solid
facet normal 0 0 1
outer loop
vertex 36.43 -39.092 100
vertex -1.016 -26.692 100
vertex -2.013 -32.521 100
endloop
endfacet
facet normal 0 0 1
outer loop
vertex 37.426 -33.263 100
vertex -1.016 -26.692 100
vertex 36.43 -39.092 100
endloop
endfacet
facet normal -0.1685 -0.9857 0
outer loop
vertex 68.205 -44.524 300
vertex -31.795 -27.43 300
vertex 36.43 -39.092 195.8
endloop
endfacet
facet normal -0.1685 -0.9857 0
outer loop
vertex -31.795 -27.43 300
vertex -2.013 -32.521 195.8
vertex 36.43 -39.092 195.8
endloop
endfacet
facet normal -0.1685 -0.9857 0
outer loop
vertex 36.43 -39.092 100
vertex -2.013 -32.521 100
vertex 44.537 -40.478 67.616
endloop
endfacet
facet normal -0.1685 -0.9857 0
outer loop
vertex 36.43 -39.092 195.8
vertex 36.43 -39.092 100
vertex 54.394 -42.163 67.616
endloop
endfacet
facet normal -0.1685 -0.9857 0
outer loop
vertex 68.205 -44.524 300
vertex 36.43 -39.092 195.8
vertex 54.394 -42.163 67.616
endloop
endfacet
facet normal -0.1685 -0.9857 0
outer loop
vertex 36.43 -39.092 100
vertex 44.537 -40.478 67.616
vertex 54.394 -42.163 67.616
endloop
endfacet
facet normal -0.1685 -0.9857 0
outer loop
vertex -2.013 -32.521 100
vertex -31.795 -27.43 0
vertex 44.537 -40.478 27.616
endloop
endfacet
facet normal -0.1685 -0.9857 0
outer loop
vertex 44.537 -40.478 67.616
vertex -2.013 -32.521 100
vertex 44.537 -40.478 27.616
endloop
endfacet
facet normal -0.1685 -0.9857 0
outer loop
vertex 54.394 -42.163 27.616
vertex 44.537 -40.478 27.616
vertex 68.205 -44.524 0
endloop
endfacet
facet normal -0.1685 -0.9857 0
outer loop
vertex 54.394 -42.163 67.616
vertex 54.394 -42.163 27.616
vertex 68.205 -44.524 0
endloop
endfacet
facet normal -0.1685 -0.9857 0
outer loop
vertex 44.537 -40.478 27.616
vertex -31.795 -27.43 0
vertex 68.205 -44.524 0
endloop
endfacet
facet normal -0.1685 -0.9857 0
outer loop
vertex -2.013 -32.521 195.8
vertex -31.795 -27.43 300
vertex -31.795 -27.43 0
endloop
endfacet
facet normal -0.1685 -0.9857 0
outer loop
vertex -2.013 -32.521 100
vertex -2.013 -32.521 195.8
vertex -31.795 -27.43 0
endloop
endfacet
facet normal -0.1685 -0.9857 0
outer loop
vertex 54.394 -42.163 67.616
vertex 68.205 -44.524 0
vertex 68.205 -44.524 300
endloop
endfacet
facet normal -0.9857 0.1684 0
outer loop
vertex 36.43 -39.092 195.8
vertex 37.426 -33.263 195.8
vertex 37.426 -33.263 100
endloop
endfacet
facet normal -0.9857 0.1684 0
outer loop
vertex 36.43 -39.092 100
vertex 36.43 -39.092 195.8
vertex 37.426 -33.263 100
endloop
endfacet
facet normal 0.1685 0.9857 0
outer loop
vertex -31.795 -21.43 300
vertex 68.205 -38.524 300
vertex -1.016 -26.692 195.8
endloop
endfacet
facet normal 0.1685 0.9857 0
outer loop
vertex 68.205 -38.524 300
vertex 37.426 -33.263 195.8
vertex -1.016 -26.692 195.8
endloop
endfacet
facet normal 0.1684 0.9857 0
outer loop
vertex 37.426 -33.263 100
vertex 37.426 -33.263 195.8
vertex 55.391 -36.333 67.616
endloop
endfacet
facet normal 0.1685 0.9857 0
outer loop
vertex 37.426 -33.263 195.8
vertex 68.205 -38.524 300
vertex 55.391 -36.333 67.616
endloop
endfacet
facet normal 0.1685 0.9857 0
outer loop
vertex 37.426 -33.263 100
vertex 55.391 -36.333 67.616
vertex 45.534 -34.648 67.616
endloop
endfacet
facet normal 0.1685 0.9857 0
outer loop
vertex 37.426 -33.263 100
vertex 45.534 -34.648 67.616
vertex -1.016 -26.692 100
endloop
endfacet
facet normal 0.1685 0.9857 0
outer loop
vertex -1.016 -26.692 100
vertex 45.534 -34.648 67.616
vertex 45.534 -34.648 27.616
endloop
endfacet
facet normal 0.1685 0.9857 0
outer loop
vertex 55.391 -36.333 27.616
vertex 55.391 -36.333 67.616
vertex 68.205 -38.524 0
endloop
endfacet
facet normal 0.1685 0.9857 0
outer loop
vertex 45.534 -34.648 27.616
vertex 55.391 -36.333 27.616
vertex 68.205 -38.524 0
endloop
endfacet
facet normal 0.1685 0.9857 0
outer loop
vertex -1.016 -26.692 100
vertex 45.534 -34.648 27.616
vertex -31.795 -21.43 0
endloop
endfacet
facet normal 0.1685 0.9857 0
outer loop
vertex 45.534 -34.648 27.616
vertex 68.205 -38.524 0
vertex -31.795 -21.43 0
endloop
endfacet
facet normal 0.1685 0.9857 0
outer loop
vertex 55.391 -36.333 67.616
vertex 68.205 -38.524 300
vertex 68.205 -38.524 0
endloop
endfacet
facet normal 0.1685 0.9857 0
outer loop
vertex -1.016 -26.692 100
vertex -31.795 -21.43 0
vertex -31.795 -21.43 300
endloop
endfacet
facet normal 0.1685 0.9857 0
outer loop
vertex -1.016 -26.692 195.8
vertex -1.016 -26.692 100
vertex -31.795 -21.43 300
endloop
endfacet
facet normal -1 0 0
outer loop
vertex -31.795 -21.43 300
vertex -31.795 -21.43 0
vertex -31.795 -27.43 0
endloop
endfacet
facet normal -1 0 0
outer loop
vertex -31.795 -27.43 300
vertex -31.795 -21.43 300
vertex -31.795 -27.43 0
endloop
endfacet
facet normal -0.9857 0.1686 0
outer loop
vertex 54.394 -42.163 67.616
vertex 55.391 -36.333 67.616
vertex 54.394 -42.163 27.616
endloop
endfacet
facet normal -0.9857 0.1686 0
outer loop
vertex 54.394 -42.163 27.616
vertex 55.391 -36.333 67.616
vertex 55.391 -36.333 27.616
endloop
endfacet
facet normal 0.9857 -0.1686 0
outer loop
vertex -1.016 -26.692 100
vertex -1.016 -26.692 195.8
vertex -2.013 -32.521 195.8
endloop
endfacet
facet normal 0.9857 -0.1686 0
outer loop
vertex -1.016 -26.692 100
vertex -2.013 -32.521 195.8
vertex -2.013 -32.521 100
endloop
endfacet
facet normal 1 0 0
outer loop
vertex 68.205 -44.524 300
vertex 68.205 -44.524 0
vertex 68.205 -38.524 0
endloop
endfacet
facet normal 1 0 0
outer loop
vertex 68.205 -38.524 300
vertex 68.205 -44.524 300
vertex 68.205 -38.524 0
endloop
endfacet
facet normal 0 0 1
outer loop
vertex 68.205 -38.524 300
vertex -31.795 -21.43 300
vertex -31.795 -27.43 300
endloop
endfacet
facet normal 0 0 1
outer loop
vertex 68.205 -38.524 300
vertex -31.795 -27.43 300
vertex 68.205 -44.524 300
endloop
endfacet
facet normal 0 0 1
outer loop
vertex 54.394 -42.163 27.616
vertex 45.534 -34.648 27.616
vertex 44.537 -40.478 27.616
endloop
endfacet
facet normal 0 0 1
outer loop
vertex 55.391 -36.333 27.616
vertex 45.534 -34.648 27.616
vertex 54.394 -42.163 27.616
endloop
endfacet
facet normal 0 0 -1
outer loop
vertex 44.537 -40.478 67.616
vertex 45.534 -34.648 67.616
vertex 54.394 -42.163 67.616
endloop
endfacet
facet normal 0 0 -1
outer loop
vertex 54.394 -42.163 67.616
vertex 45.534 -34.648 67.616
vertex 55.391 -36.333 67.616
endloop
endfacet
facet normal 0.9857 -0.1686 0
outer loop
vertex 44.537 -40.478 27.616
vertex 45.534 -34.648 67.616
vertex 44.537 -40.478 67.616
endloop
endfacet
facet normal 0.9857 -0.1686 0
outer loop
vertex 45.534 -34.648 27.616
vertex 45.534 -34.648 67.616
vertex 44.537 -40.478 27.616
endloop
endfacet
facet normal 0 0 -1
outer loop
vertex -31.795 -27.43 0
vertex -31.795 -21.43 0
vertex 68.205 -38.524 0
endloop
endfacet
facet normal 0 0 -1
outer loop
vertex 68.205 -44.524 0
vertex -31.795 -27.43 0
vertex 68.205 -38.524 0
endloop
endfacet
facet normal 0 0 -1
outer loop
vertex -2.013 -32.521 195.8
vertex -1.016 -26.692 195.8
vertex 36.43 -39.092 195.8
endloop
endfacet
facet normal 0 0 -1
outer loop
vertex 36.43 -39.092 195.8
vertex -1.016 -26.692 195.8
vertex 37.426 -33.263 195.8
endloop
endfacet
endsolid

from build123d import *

# Parameters (mm, degrees)
BOSS_EXTRUDE1_DEPTH = 300
SKETCH3_W           = 39
SKETCH3_H           = 95.8
CUT_EXTRUDE2_DEPTH  = 15
SKETCH5_W           = 10
SKETCH5_H           = 40
CUT_EXTRUDE3_DEPTH  = 10


with BuildPart() as part:
    # Sketch2 → Boss-Extrude1 (new body)
    with BuildSketch(Plane.XY):
        Polygon((68.204834584, -44.523707756), (68.204834584, -38.523707756), (-31.795165416, -21.430394722), (-31.795165416, -27.430394722), align=None)
    extrude(amount=BOSS_EXTRUDE1_DEPTH)

    # Sketch3 → Cut-Extrude2 (cut)
    with BuildSketch(Plane(origin=(-4.461794575, -26.102573363, 0), x_dir=(0.9857034690888548, -0.1684893795649959, 0), z_dir=(0.16848937956499588, 0.9857034690888546, 0))):
        with Locations((22.995383369, -147.9)):
            Rectangle(SKETCH3_W, SKETCH3_H)
    extrude(amount=-CUT_EXTRUDE2_DEPTH, mode=Mode.SUBTRACT)

    # Sketch5 → Cut-Extrude3 (cut)
    with BuildSketch(Plane(origin=(-4.461794575, -26.102573363, 0), x_dir=(0.9857034690888548, -0.16848937956499582, 0), z_dir=(0.16848937956499585, 0.9857034690888549, 0))):
        with Locations((55.720577677, -47.61631705)):
            Rectangle(SKETCH5_W, SKETCH5_H)
    extrude(amount=-CUT_EXTRUDE3_DEPTH, mode=Mode.SUBTRACT)


solid = part.part
